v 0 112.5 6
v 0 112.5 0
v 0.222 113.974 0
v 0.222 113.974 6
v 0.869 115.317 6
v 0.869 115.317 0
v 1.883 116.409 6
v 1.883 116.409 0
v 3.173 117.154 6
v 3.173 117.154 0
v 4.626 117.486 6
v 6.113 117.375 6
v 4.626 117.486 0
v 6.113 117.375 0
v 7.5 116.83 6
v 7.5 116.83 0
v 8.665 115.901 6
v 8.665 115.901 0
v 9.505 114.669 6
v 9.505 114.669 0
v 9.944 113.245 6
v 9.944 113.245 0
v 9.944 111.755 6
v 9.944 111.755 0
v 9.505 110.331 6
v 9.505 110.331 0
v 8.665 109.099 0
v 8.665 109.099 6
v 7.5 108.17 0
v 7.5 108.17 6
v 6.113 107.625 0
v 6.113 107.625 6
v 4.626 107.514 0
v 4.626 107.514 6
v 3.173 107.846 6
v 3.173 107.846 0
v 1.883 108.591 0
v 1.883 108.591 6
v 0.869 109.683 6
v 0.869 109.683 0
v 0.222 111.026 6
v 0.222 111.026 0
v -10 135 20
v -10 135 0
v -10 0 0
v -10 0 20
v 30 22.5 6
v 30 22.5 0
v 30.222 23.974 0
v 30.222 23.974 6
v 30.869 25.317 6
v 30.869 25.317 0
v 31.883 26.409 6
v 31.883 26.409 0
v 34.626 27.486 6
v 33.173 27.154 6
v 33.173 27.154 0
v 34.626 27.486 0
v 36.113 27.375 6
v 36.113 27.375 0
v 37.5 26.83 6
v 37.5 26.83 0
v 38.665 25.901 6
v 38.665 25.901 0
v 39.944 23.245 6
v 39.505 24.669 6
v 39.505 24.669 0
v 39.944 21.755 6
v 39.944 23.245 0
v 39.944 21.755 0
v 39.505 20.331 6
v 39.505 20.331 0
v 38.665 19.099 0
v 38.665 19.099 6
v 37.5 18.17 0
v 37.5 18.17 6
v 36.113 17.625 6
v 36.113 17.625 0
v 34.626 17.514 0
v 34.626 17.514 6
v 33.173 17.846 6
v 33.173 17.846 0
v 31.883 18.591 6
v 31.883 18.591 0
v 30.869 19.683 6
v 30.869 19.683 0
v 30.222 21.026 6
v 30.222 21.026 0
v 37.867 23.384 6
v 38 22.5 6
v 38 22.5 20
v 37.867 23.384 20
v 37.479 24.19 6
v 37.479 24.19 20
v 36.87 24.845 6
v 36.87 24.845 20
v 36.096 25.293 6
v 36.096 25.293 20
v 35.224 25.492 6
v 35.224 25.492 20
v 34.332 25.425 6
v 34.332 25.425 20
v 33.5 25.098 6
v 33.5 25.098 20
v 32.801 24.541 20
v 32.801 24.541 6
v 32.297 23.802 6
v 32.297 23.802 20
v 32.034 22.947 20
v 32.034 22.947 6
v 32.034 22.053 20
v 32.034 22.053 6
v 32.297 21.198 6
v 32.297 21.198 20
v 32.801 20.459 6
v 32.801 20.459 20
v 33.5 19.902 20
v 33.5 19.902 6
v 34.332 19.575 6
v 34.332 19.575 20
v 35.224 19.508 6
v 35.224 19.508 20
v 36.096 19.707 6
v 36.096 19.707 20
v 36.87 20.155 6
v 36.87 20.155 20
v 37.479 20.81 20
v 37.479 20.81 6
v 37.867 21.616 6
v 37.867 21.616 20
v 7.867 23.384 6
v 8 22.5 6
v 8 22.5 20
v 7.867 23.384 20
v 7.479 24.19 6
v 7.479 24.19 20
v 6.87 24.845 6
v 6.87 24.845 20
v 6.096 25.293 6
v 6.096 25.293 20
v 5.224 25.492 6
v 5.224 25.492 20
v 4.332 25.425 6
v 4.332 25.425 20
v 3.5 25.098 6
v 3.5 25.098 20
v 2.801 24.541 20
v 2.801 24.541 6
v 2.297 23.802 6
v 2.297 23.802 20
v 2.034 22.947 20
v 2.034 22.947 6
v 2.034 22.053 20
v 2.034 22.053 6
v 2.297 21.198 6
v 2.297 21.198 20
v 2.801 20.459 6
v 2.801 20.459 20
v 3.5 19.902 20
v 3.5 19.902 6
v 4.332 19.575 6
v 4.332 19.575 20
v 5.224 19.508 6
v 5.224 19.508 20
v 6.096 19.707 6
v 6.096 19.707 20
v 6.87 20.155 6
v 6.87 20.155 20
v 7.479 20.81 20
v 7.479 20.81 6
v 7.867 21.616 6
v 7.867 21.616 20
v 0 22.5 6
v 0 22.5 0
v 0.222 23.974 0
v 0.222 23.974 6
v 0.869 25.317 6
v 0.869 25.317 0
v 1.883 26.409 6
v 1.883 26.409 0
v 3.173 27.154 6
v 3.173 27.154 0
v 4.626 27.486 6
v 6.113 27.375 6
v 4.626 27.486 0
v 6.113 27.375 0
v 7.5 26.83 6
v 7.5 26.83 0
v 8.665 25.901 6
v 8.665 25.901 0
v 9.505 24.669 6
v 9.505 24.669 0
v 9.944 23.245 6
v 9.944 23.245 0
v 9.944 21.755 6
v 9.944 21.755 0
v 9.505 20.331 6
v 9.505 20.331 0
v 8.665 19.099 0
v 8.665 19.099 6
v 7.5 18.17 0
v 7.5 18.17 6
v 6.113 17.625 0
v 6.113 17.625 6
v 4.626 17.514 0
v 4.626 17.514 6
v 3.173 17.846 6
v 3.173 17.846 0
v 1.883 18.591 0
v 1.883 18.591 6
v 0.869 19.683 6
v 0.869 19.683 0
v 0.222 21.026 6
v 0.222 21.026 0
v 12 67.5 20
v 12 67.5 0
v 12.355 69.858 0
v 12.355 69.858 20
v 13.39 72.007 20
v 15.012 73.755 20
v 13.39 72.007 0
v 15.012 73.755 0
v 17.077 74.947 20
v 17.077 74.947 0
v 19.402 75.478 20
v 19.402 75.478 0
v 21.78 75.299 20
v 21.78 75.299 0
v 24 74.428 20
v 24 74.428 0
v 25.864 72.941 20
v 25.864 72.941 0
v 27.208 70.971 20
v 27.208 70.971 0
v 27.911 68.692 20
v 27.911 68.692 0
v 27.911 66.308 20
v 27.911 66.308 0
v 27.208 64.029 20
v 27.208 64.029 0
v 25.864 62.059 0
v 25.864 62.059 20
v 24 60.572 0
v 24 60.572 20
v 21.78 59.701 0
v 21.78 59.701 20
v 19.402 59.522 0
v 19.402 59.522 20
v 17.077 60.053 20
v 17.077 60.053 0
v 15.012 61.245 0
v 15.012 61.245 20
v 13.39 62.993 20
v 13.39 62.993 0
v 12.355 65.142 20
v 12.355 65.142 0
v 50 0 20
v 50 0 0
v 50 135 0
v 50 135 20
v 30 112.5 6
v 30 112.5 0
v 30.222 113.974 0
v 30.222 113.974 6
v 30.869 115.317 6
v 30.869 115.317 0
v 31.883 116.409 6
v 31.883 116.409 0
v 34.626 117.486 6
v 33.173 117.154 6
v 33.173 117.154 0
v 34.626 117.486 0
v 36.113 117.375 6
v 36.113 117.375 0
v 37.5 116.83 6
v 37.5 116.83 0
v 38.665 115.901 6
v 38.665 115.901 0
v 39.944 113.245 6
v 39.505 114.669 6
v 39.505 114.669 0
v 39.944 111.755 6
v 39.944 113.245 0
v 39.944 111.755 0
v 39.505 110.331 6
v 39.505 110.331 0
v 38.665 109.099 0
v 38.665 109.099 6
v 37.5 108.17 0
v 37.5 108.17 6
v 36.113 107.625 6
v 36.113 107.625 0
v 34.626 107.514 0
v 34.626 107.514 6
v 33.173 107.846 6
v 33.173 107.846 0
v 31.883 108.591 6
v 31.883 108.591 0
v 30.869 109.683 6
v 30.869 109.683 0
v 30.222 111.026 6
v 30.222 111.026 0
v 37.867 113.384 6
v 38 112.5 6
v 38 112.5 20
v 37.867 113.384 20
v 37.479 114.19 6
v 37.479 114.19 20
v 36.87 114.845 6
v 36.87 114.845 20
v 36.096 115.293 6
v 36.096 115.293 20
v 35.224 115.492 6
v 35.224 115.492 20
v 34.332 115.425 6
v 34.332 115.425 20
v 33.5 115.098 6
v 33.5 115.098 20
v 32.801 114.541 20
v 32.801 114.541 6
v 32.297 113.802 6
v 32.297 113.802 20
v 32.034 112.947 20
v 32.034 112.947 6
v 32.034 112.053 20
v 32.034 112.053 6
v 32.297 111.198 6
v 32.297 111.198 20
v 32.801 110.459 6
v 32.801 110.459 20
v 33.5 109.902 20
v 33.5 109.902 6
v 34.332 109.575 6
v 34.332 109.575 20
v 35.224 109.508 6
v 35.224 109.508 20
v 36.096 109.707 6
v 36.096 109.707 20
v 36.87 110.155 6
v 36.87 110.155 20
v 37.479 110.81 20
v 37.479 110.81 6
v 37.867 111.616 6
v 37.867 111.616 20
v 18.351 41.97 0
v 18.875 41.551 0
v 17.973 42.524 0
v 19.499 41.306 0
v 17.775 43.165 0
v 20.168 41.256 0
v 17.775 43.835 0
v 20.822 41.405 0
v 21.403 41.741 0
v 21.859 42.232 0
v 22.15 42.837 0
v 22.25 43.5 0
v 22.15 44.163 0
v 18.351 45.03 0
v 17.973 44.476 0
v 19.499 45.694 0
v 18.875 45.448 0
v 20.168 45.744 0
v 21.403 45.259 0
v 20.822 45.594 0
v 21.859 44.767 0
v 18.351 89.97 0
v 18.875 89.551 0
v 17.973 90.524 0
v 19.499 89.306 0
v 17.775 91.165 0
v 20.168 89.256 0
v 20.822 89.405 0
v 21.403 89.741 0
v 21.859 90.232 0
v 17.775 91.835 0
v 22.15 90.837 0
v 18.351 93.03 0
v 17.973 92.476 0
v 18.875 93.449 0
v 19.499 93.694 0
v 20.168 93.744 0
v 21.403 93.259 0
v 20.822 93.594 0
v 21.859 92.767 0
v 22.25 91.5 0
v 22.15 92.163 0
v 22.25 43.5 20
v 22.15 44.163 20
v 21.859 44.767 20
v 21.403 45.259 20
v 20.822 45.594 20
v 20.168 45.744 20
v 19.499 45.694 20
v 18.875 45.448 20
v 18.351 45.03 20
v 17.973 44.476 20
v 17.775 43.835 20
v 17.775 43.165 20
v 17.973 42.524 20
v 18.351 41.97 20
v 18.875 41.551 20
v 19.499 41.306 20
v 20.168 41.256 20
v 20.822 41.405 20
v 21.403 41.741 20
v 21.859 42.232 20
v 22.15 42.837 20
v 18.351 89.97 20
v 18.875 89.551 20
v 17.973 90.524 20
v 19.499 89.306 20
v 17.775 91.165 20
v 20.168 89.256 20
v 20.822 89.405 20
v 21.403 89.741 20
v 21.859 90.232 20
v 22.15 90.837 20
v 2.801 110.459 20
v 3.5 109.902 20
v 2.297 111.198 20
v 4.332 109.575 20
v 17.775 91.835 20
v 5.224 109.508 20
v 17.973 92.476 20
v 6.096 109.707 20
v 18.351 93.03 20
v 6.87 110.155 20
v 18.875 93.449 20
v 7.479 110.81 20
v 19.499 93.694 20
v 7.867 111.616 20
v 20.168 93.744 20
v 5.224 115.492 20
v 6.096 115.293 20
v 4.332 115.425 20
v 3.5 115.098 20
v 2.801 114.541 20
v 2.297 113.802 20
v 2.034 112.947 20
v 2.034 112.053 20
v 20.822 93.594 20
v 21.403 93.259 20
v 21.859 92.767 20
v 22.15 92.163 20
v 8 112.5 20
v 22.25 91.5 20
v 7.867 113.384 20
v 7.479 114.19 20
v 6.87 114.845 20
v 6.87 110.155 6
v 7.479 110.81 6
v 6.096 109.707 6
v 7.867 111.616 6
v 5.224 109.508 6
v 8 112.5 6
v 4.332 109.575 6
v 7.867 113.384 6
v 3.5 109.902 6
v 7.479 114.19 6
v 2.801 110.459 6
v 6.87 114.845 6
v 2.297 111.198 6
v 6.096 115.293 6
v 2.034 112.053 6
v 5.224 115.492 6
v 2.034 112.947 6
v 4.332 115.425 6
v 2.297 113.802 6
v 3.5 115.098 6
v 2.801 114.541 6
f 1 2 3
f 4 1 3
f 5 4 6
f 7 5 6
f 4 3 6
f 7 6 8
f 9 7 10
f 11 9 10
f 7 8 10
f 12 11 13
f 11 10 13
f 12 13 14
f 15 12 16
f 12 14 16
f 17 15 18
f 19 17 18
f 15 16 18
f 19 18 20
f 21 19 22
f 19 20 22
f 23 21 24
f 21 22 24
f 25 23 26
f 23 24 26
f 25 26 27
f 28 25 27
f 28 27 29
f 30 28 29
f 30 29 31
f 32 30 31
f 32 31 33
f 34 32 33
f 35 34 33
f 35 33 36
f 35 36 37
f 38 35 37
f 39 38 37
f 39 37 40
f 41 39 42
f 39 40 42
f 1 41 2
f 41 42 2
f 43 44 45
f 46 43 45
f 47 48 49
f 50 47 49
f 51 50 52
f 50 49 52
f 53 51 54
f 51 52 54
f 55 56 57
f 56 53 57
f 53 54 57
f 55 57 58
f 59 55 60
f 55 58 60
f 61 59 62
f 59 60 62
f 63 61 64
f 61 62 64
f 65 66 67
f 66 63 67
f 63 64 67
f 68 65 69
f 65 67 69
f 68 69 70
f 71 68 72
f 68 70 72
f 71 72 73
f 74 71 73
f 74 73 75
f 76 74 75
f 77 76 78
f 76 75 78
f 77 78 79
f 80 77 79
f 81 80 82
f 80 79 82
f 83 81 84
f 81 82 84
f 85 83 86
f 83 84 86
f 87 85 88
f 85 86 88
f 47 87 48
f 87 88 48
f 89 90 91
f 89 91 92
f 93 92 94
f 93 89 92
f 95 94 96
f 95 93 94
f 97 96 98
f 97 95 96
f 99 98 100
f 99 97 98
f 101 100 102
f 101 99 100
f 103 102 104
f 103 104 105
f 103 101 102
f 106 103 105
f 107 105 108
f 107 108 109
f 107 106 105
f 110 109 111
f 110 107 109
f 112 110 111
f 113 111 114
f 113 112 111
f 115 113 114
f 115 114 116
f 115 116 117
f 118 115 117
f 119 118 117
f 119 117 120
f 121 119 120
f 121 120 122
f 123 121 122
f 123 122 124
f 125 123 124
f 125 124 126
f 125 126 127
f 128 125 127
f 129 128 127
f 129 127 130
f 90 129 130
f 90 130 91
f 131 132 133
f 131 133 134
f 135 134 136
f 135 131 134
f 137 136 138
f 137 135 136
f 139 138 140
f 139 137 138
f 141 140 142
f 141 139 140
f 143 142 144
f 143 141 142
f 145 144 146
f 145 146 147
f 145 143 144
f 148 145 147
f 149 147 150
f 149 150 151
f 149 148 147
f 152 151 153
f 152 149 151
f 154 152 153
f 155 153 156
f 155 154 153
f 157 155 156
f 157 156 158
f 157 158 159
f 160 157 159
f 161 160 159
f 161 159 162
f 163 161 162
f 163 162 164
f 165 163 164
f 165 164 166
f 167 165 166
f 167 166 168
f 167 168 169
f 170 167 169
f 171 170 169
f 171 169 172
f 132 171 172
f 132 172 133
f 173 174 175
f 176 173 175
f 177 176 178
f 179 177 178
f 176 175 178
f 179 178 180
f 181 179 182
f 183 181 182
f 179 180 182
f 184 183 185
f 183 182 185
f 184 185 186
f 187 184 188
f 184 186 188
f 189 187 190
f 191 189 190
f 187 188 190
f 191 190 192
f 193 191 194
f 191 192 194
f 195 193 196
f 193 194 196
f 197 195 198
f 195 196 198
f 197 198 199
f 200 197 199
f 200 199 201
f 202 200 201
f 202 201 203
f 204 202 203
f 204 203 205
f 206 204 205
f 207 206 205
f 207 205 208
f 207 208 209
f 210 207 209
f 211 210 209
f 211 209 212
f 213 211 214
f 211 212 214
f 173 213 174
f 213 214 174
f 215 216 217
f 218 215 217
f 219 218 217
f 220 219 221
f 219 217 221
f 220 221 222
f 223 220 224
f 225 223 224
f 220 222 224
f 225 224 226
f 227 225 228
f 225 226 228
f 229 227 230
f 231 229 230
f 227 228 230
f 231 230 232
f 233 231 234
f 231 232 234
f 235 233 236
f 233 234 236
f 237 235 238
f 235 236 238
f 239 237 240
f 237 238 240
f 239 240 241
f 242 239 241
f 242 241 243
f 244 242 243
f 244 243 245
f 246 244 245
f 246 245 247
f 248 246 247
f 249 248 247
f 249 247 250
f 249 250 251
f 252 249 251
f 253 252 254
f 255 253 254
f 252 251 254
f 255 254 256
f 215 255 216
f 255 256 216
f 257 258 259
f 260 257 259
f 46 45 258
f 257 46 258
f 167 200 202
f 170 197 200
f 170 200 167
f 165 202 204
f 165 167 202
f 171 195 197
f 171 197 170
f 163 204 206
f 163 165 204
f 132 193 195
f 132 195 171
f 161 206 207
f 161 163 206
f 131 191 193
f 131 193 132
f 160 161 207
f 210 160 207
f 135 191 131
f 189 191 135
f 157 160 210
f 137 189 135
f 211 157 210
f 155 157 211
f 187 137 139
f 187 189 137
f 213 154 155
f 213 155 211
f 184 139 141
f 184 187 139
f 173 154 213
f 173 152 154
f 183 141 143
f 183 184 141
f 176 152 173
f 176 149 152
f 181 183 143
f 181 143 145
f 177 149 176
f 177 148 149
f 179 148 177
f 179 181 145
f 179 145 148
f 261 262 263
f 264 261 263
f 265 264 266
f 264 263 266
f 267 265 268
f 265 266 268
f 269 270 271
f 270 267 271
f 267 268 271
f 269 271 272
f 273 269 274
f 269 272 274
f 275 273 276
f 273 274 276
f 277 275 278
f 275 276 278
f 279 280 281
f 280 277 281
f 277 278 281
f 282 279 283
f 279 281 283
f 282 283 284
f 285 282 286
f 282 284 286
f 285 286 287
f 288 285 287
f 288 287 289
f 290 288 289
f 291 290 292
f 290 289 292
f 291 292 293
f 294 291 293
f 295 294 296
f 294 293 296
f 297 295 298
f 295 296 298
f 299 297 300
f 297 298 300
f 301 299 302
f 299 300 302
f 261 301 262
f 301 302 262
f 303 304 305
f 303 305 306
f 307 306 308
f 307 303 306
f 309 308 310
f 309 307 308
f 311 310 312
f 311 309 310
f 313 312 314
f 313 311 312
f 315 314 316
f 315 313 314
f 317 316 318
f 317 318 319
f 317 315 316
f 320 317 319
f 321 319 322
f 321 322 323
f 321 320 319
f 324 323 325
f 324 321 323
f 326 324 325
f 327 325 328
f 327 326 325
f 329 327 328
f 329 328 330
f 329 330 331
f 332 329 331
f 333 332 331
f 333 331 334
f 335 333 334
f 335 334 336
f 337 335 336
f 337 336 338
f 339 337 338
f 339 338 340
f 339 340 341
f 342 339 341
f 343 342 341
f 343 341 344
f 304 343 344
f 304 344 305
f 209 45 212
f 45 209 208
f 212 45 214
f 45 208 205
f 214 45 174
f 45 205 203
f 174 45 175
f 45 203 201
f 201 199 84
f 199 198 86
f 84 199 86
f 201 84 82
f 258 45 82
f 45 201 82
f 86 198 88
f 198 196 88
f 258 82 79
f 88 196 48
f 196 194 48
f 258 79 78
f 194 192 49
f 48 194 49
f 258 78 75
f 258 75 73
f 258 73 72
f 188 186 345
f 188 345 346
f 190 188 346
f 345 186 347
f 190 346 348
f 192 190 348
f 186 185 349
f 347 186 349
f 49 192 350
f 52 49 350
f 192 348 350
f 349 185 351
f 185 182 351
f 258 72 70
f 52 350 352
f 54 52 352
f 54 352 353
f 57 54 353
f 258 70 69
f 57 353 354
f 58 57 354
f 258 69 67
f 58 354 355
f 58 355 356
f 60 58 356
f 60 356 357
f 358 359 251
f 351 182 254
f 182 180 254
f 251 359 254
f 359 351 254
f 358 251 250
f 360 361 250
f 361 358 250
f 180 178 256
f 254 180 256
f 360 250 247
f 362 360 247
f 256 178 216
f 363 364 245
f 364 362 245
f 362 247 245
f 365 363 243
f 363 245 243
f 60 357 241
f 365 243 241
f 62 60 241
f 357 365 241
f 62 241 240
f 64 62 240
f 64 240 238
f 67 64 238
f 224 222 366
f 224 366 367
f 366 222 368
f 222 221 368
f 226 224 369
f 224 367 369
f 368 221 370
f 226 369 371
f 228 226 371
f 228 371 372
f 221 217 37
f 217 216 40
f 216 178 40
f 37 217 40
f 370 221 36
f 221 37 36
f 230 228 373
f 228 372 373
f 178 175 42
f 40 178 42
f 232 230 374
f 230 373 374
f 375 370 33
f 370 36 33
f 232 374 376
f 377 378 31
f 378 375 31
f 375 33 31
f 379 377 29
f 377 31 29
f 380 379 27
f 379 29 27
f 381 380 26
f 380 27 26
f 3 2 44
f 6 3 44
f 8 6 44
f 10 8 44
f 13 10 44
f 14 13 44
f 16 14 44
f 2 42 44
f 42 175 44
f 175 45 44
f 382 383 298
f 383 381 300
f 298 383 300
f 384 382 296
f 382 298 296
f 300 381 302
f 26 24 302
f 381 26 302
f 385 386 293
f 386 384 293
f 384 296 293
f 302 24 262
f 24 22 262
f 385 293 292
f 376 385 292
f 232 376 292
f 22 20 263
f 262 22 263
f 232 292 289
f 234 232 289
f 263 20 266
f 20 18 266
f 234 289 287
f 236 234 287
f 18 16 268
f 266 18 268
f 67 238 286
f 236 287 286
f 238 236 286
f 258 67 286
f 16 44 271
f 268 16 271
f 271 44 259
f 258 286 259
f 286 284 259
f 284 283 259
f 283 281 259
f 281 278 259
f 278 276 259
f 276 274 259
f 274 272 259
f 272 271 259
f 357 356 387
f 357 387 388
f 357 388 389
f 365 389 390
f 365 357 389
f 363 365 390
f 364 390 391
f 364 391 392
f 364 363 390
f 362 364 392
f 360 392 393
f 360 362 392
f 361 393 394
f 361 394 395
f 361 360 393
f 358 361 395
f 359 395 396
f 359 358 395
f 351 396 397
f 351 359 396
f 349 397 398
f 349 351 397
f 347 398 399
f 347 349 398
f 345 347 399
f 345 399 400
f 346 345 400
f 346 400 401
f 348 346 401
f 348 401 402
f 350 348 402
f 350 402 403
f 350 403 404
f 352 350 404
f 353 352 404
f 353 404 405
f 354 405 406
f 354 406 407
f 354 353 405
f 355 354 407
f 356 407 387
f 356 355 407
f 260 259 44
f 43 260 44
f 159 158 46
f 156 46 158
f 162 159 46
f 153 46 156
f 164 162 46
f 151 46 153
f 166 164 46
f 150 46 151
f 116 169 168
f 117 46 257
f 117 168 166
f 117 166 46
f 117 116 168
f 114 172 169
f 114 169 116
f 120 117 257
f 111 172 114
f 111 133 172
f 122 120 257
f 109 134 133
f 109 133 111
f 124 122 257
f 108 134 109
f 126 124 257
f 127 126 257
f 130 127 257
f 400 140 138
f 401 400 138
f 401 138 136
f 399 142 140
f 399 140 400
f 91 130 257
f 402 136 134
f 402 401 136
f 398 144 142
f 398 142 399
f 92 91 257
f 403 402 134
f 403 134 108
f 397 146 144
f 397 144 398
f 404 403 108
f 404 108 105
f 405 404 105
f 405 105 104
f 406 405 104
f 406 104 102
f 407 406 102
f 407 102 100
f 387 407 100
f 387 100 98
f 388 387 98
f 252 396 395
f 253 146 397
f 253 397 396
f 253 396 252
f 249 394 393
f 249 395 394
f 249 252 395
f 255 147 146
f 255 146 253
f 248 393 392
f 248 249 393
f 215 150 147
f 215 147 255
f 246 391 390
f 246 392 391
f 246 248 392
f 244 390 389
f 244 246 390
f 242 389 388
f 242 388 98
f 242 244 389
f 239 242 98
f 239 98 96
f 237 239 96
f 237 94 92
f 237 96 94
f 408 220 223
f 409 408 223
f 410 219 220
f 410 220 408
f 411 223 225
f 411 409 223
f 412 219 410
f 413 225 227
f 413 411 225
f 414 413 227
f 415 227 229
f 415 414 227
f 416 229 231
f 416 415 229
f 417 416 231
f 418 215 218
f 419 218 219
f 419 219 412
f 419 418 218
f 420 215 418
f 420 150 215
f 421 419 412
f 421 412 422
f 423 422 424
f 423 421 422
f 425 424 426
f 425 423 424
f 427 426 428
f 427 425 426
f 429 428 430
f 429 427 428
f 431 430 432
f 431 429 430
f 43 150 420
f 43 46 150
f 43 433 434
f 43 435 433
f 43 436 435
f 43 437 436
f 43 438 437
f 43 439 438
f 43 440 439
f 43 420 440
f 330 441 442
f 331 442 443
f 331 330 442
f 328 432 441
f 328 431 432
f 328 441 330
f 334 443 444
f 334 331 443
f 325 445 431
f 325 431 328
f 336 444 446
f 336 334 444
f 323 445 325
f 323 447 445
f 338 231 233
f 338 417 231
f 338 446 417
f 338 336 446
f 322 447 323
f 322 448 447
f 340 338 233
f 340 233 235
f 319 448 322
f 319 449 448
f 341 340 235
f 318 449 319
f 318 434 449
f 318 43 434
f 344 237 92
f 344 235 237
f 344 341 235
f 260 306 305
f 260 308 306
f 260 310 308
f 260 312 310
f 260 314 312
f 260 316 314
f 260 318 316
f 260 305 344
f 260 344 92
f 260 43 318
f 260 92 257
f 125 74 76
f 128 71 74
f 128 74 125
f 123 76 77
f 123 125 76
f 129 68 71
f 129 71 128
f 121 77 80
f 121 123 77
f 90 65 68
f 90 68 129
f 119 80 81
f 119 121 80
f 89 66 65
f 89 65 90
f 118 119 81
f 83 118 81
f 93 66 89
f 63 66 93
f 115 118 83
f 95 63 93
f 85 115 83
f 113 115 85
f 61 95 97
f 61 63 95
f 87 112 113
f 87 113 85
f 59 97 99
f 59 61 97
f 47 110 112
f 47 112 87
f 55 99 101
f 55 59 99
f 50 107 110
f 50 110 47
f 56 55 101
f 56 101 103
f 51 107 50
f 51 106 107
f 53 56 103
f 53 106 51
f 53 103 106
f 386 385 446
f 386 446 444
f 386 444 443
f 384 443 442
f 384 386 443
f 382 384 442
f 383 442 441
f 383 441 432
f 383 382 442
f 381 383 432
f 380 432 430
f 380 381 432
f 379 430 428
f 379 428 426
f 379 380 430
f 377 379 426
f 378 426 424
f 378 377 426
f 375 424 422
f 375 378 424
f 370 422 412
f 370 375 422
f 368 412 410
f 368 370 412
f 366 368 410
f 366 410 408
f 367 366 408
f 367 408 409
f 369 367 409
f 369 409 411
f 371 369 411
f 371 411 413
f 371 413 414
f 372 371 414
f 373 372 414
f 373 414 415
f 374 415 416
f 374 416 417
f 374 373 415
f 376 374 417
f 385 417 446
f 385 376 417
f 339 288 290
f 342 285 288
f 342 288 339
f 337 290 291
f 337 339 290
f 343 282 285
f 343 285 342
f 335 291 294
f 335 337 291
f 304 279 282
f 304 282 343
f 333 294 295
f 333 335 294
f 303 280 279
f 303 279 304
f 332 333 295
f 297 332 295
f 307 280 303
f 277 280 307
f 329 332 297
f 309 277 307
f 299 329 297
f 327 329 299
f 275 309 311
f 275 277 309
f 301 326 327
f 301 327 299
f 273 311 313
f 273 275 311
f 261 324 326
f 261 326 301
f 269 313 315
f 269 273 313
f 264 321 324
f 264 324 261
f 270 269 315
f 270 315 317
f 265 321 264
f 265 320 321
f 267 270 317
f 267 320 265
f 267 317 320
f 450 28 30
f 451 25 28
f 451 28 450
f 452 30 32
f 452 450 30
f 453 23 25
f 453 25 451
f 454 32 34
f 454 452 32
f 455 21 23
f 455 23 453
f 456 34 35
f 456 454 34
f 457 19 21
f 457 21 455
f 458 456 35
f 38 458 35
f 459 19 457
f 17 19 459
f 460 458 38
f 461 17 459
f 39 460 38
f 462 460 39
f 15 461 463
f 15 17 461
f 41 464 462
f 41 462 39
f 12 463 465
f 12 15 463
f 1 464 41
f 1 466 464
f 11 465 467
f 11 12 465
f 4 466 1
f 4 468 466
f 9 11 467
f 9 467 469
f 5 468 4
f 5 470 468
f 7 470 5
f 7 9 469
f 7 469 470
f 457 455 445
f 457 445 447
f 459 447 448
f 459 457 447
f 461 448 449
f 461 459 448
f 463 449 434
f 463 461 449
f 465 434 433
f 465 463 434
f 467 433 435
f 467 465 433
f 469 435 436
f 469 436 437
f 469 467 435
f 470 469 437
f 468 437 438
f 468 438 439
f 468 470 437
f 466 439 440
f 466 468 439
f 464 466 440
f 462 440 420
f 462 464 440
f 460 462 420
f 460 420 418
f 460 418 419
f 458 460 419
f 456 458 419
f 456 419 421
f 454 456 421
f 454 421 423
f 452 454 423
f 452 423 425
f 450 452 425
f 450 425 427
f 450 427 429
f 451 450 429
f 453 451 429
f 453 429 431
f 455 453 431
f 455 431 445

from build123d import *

# Parameters (mm, degrees)
SKETCH1_R          = 3
SKETCH1_R_2        = 2.25
EXTRUDE1_DEPTH     = 20
SKETCH2_R          = 5
CUT_EXTRUDE1_DEPTH = 6
SKETCH3_R          = 8
CUT_EXTRUDE2_DEPTH = 20
SKETCH4_W          = 10
SKETCH4_H          = 135
EXTRUDE2_DEPTH     = 20


with BuildPart() as part:
    # Sketch1 → Extrude1 (new body)
    with BuildSketch(Plane.XY):
        Polygon((5, 135), (0, 135), (-10, 135), (-10, 0), (0, 0), (40, 0), (50, 0), (50, 135), (40, 135), align=None)
        with Locations((5, 22.5)):
            Circle(SKETCH1_R, mode=Mode.SUBTRACT)
        with Locations((35, 22.5)):
            Circle(SKETCH1_R, mode=Mode.SUBTRACT)
        with Locations((20.000131027, 43.499934589)):
            Circle(SKETCH1_R_2, mode=Mode.SUBTRACT)
        with Locations((5, 112.5)):
            Circle(SKETCH1_R, mode=Mode.SUBTRACT)
        with Locations((20.000131027, 91.49994372)):
            Circle(SKETCH1_R_2, mode=Mode.SUBTRACT)
        with Locations((35, 112.5)):
            Circle(SKETCH1_R, mode=Mode.SUBTRACT)
    extrude(amount=EXTRUDE1_DEPTH)

    # Sketch2 → Cut-Extrude1 (cut)
    with BuildSketch(Plane(origin=(0, 0, 0), x_dir=(-1, 0, 0), z_dir=(0, 0, -1))):
        with Locations((-35, 112.5)):
            Circle(SKETCH2_R)
        with Locations((-5, 112.5)):
            Circle(SKETCH2_R)
        with Locations((-35, 22.5)):
            Circle(SKETCH2_R)
        with Locations((-5, 22.5)):
            Circle(SKETCH2_R)
    extrude(amount=-CUT_EXTRUDE1_DEPTH, mode=Mode.SUBTRACT)

    # Sketch3 → Cut-Extrude2 (cut)
    with BuildSketch(Plane(origin=(0, 0, 0), x_dir=(-1, 0, 0), z_dir=(0, 0, -1))):
        with Locations((-20, 67.5)):
            Circle(SKETCH3_R)
    extrude(amount=-CUT_EXTRUDE2_DEPTH, mode=Mode.SUBTRACT)

    # Sketch4 → Extrude2 (add)
    with BuildSketch(Plane(origin=(0, 0, 0), x_dir=(-1, 0, 0), z_dir=(0, 0, -1))):
        with Locations((-45, 67.5)):
            Rectangle(SKETCH4_W, SKETCH4_H)
        with Locations((5, 67.5)):
            Rectangle(SKETCH4_W, SKETCH4_H)
    extrude(amount=-EXTRUDE2_DEPTH)


solid = part.part
